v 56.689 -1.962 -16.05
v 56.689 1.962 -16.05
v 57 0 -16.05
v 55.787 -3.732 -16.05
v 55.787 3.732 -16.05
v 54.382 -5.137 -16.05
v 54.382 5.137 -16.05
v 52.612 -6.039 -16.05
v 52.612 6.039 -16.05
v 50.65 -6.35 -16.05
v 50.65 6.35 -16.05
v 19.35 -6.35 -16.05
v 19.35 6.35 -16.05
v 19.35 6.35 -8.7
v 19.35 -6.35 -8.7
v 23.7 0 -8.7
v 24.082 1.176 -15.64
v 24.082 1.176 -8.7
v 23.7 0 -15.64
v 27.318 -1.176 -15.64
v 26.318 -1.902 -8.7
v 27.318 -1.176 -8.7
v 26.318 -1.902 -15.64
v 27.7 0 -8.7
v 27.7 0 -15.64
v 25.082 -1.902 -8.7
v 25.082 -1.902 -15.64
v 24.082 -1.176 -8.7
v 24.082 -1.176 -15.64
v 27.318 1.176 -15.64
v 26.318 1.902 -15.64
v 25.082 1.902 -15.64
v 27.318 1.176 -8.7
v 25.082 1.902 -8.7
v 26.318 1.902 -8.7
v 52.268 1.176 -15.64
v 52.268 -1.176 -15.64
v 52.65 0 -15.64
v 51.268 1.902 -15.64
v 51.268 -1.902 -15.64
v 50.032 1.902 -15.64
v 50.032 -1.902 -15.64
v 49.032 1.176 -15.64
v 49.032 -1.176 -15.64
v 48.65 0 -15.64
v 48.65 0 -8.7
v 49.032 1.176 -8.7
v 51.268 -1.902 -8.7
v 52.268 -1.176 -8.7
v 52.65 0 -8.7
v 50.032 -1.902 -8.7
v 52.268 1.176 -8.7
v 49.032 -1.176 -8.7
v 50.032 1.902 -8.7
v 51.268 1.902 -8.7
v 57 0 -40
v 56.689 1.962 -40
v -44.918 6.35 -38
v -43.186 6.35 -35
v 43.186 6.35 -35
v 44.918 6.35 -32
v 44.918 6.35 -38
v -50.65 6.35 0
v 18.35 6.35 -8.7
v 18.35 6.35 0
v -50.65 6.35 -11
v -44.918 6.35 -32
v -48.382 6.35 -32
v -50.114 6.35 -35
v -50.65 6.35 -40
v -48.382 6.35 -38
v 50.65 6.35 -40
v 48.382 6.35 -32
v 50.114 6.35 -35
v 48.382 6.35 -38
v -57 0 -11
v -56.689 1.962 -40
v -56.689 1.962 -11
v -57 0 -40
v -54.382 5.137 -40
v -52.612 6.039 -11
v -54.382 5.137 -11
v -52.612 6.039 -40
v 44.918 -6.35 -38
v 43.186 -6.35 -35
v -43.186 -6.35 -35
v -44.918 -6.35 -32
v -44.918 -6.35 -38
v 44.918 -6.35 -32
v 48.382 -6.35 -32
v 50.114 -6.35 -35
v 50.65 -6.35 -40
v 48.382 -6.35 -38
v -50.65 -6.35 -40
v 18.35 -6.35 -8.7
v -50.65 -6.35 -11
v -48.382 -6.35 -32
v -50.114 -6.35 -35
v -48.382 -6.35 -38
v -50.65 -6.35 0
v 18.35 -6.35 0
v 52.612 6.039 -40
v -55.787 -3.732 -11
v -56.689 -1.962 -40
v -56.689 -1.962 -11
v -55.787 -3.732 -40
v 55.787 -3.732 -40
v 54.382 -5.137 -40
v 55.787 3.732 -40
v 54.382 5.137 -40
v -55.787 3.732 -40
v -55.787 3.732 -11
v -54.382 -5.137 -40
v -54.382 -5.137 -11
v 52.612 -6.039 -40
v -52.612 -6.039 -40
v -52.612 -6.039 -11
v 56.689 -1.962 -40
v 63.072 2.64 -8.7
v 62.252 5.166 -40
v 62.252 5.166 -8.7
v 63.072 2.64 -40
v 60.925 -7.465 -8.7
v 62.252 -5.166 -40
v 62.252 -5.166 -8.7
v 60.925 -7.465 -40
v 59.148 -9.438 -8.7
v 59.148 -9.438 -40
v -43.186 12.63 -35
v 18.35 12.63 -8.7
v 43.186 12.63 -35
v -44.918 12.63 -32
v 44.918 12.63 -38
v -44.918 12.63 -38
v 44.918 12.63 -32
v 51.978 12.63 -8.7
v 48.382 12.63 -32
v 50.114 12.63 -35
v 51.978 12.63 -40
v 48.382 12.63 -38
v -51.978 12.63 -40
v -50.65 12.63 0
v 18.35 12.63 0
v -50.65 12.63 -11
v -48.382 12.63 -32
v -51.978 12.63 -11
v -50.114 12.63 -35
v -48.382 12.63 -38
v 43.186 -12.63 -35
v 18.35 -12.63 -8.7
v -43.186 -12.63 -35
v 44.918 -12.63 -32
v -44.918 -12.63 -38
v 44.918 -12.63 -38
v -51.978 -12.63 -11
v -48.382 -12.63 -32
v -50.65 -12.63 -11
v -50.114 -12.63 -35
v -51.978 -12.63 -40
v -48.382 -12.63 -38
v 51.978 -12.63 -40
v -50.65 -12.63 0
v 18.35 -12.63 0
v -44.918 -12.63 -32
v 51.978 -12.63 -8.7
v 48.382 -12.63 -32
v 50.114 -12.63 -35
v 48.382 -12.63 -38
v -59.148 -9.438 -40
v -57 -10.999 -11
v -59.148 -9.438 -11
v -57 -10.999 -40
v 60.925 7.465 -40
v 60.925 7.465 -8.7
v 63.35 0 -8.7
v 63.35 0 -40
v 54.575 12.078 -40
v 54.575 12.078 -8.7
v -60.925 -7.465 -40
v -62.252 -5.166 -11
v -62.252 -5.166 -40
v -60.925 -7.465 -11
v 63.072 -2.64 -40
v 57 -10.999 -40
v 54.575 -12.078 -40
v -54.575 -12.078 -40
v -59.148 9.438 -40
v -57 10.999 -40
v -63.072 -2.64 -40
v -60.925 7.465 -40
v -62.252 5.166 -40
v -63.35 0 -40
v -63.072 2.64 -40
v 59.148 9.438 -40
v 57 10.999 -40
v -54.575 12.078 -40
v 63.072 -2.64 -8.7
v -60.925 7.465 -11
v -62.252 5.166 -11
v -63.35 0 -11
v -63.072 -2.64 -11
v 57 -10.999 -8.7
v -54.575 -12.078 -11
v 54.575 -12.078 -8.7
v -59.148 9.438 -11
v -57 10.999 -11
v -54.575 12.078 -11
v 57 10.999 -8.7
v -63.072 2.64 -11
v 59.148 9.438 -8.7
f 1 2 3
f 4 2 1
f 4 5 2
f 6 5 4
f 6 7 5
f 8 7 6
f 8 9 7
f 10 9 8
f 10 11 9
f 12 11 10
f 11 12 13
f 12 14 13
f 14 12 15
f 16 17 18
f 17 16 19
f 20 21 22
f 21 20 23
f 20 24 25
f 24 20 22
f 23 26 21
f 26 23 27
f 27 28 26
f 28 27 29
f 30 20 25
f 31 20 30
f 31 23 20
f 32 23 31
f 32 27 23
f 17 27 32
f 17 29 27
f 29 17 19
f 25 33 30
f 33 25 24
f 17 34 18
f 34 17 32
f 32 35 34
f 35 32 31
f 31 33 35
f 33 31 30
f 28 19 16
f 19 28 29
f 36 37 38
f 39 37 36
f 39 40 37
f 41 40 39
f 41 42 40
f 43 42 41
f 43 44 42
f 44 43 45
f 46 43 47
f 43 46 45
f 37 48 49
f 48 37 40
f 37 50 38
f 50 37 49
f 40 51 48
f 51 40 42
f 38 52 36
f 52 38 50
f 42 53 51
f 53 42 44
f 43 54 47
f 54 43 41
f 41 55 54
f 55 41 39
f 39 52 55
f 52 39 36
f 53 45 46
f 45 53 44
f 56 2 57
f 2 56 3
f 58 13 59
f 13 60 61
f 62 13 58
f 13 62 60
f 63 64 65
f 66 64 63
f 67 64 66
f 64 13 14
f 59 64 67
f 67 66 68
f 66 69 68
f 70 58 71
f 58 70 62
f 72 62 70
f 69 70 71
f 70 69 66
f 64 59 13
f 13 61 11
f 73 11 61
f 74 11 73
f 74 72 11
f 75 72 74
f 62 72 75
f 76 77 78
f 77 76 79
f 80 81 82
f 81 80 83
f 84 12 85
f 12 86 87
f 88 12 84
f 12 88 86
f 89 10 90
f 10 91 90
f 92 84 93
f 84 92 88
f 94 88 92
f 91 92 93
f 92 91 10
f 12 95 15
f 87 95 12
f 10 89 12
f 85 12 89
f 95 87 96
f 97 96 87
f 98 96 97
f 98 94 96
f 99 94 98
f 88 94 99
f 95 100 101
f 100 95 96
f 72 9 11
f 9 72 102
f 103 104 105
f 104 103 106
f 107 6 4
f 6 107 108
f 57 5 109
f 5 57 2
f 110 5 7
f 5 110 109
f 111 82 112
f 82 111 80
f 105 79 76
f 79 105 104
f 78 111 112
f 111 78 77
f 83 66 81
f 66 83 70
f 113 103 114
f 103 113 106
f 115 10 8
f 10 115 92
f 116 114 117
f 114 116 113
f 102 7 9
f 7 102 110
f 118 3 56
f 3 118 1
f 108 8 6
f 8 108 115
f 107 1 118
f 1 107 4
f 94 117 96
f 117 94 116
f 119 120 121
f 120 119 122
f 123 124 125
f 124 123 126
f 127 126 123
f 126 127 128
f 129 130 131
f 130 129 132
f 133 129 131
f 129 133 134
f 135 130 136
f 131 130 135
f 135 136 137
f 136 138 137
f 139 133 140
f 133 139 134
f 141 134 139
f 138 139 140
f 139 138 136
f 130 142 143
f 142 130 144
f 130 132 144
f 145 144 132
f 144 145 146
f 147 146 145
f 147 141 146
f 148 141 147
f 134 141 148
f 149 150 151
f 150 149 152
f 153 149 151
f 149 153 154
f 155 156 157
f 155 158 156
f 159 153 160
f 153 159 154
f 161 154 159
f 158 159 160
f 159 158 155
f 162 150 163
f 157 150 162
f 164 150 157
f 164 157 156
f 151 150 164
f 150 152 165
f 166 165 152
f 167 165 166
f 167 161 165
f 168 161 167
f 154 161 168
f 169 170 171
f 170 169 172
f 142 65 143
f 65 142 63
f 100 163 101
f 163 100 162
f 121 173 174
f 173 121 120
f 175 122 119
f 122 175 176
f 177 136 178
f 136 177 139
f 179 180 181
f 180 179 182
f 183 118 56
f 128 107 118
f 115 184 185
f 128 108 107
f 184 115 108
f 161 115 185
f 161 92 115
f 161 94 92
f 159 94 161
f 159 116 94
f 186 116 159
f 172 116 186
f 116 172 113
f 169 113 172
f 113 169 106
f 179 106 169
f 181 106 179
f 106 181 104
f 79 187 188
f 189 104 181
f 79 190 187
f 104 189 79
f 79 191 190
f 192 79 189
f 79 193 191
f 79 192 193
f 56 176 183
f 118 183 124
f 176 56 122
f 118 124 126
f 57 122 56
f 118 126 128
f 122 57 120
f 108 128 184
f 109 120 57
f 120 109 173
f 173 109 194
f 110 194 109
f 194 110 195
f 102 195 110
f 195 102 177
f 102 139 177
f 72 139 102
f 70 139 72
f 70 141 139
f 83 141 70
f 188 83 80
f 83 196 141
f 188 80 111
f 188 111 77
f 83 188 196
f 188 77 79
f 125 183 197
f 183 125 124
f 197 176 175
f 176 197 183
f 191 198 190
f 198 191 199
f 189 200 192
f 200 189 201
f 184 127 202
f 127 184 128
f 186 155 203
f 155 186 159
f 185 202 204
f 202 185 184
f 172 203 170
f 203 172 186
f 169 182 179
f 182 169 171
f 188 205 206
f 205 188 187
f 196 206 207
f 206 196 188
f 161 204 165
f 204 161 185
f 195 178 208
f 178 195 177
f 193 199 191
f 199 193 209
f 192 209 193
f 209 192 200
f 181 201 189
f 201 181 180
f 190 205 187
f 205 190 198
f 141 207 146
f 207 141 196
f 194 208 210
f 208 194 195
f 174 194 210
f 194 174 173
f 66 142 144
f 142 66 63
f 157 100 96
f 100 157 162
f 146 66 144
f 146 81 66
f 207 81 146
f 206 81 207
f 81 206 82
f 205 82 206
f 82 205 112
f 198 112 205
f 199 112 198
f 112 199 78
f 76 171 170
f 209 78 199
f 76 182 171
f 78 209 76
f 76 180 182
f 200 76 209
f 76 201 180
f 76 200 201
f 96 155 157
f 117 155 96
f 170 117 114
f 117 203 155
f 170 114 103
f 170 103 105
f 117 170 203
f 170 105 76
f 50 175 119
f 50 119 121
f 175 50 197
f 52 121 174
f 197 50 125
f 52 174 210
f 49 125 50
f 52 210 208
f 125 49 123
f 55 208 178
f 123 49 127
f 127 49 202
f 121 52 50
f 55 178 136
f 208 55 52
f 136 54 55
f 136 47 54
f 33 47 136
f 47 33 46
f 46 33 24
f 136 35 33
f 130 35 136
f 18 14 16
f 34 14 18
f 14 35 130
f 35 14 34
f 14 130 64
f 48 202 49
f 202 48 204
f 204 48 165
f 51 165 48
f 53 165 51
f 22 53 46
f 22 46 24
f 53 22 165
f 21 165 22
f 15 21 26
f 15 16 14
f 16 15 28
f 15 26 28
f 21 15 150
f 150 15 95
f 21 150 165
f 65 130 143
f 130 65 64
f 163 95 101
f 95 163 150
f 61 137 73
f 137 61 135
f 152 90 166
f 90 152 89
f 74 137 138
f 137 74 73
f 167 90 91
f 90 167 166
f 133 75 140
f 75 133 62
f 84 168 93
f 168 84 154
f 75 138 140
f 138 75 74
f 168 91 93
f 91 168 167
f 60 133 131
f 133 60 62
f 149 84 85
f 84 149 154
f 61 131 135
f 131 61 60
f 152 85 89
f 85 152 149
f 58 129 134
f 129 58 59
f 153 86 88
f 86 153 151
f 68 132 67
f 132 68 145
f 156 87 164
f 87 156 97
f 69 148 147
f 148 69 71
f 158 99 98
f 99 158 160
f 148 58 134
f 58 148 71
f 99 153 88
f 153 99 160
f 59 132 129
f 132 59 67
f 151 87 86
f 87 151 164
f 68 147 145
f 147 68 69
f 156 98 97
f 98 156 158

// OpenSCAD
// What type of framing finger?
part=1; // [1:Top Finger, 2:Bottom Finger, 3:Side Finger, 4:Bar Holder]

// Distance from back of glass to wall.
height=40;

// How tall is the frame?
frame_height_v=590;

// How wide is the frame?
frame_width_v=742;

// How tall is the space in the frame for the glass?
glass_height_v=461;

// How wide is the space in the frame for the glass?
glass_width_v=612;

// How deep is the glass from the back of the frame?
glass_offset=8.7;

// Monitor thickness at the top edge.
monitor_thickness_top=11;

// Monitor thickness at the bottom edge.
monitor_thickness_bottom=8;

// Monitor width
monitor_width_v=545;

// Monitor height
monitor_height_v=322;

// How much wiggle room?
wiggle=0.5;

// Layer thickness.
layer=0.41;

// Total finger width.
width=25.4;

/* [Hidden] */

inch=25.4;
thickness=width/4;
screw_depth=inch / 4 + 1;

frame_height=frame_height_v + wiggle;
frame_width=frame_width_v + wiggle;
glass_height=glass_height_v - wiggle;
glass_width=glass_width_v - wiggle;
monitor_width=monitor_width_v + wiggle;
monitor_height=monitor_height_v + wiggle;

frame_hook=(frame_height - glass_height)/2 - height/2;

module ovoid(len,width,height) {
  hull() {
    translate([(len-width)/2, 0, ]) cylinder(r=width/2, h=height);
    translate([(width-len)/2, 0, ]) cylinder(r=width/2, h=height);
  }
}

module basic_finger(width, offset, monitor_thickness) {
  length = frame_hook+ offset + width/2;
  difference() {
    ovoid(length, width, height);
    translate([0,0,-1]) 
      difference() {
      ovoid(length-thickness*2, width - thickness*2, height * 2);
      translate([-length/2,-width/2,-1+glass_offset]) {
	difference() {
	  cube([length - 1, width,screw_depth + 2]);
	  translate([width/2, width/2, 0]) cylinder(r=2, $fn=10, h=screw_depth+2-layer);
	  translate([length - width/2, width/2, 0]) cylinder(r=2, $fn=10, h=screw_depth+2-layer);
	  translate([length/2, width/2, 0]) cylinder(r=2, $fn=10, h=screw_depth+2-layer);
	}
      }
    }

    translate([0,0,0]) cube([length + 2,width+2,glass_offset * 2], center=true);

    translate([length/2-width/2-4,0,height - 5])
      rotate([90,0,0])
      cylinder(r=3 / cos(180/6), $fn=6, h=width + 2, center=true);

    translate([0,0,height - 5])
      rotate([90,0,0])
      cylinder(r=3 / cos(180/6), $fn=6, h=width + 2, center=true);

    rotate([0,0,180])
      translate([length/2-width/2-4,0,height - 5])
      rotate([90,0,0])
      cylinder(r=3 / cos(180/6), $fn=6, h=width + 2, center=true);
  }
}


module finger(width, offset, monitor_thickness) {
  length = frame_hook+ offset + width/2;
  difference() {
    ovoid(length, width, height);
    translate([0,0,-1]) 
      difference() {
      ovoid(length-thickness*2, width - thickness*2, height * 2);
      translate([length/2-frame_hook+1,-width/2,-1+glass_offset]) {
	difference() {
	  cube([frame_hook - thickness/2,width,screw_depth + 2]);
	  translate([thickness, width/2, 0]) cylinder(r=2, $fn=10, h=screw_depth+2-layer);
	  translate([frame_hook - width/2 -1, width/2, 0]) cylinder(r=2, $fn=10, h=screw_depth+2-layer);
	}
      }
    }

    translate([-length/2,0,0]) cube([width,width+2,monitor_thickness * 2], center=true);
    translate([length/2,0,0]) cube([frame_hook*2,width+2,glass_offset * 2], center=true);

    translate([length/2-width/2-4,0,height - 5])
      rotate([90,0,0])
      cylinder(r=3 / cos(180/6), $fn=6, h=width + 2, center=true);

    rotate([0,0,180])
      translate([length/2-width/2-4,0,height - 5])
      rotate([90,0,0])
      cylinder(r=3 / cos(180/6), $fn=6, h=width + 2, center=true);
  }
}

rotate([180,0,0]) {

// Fingers for the top edge
if(part == 1) finger(width, (glass_height-monitor_height)/2, monitor_thickness_top);

// Fingers for the bottom edge
if(part == 2) finger(width, (glass_height-monitor_height)/2, monitor_thickness_bottom);

// Fingers for the side
if(part == 3) finger(width, (glass_width-monitor_width)/2, monitor_thickness_bottom);

// Bar holder
if(part == 4) basic_finger(width, (glass_width-monitor_width)/2, 0);

}
